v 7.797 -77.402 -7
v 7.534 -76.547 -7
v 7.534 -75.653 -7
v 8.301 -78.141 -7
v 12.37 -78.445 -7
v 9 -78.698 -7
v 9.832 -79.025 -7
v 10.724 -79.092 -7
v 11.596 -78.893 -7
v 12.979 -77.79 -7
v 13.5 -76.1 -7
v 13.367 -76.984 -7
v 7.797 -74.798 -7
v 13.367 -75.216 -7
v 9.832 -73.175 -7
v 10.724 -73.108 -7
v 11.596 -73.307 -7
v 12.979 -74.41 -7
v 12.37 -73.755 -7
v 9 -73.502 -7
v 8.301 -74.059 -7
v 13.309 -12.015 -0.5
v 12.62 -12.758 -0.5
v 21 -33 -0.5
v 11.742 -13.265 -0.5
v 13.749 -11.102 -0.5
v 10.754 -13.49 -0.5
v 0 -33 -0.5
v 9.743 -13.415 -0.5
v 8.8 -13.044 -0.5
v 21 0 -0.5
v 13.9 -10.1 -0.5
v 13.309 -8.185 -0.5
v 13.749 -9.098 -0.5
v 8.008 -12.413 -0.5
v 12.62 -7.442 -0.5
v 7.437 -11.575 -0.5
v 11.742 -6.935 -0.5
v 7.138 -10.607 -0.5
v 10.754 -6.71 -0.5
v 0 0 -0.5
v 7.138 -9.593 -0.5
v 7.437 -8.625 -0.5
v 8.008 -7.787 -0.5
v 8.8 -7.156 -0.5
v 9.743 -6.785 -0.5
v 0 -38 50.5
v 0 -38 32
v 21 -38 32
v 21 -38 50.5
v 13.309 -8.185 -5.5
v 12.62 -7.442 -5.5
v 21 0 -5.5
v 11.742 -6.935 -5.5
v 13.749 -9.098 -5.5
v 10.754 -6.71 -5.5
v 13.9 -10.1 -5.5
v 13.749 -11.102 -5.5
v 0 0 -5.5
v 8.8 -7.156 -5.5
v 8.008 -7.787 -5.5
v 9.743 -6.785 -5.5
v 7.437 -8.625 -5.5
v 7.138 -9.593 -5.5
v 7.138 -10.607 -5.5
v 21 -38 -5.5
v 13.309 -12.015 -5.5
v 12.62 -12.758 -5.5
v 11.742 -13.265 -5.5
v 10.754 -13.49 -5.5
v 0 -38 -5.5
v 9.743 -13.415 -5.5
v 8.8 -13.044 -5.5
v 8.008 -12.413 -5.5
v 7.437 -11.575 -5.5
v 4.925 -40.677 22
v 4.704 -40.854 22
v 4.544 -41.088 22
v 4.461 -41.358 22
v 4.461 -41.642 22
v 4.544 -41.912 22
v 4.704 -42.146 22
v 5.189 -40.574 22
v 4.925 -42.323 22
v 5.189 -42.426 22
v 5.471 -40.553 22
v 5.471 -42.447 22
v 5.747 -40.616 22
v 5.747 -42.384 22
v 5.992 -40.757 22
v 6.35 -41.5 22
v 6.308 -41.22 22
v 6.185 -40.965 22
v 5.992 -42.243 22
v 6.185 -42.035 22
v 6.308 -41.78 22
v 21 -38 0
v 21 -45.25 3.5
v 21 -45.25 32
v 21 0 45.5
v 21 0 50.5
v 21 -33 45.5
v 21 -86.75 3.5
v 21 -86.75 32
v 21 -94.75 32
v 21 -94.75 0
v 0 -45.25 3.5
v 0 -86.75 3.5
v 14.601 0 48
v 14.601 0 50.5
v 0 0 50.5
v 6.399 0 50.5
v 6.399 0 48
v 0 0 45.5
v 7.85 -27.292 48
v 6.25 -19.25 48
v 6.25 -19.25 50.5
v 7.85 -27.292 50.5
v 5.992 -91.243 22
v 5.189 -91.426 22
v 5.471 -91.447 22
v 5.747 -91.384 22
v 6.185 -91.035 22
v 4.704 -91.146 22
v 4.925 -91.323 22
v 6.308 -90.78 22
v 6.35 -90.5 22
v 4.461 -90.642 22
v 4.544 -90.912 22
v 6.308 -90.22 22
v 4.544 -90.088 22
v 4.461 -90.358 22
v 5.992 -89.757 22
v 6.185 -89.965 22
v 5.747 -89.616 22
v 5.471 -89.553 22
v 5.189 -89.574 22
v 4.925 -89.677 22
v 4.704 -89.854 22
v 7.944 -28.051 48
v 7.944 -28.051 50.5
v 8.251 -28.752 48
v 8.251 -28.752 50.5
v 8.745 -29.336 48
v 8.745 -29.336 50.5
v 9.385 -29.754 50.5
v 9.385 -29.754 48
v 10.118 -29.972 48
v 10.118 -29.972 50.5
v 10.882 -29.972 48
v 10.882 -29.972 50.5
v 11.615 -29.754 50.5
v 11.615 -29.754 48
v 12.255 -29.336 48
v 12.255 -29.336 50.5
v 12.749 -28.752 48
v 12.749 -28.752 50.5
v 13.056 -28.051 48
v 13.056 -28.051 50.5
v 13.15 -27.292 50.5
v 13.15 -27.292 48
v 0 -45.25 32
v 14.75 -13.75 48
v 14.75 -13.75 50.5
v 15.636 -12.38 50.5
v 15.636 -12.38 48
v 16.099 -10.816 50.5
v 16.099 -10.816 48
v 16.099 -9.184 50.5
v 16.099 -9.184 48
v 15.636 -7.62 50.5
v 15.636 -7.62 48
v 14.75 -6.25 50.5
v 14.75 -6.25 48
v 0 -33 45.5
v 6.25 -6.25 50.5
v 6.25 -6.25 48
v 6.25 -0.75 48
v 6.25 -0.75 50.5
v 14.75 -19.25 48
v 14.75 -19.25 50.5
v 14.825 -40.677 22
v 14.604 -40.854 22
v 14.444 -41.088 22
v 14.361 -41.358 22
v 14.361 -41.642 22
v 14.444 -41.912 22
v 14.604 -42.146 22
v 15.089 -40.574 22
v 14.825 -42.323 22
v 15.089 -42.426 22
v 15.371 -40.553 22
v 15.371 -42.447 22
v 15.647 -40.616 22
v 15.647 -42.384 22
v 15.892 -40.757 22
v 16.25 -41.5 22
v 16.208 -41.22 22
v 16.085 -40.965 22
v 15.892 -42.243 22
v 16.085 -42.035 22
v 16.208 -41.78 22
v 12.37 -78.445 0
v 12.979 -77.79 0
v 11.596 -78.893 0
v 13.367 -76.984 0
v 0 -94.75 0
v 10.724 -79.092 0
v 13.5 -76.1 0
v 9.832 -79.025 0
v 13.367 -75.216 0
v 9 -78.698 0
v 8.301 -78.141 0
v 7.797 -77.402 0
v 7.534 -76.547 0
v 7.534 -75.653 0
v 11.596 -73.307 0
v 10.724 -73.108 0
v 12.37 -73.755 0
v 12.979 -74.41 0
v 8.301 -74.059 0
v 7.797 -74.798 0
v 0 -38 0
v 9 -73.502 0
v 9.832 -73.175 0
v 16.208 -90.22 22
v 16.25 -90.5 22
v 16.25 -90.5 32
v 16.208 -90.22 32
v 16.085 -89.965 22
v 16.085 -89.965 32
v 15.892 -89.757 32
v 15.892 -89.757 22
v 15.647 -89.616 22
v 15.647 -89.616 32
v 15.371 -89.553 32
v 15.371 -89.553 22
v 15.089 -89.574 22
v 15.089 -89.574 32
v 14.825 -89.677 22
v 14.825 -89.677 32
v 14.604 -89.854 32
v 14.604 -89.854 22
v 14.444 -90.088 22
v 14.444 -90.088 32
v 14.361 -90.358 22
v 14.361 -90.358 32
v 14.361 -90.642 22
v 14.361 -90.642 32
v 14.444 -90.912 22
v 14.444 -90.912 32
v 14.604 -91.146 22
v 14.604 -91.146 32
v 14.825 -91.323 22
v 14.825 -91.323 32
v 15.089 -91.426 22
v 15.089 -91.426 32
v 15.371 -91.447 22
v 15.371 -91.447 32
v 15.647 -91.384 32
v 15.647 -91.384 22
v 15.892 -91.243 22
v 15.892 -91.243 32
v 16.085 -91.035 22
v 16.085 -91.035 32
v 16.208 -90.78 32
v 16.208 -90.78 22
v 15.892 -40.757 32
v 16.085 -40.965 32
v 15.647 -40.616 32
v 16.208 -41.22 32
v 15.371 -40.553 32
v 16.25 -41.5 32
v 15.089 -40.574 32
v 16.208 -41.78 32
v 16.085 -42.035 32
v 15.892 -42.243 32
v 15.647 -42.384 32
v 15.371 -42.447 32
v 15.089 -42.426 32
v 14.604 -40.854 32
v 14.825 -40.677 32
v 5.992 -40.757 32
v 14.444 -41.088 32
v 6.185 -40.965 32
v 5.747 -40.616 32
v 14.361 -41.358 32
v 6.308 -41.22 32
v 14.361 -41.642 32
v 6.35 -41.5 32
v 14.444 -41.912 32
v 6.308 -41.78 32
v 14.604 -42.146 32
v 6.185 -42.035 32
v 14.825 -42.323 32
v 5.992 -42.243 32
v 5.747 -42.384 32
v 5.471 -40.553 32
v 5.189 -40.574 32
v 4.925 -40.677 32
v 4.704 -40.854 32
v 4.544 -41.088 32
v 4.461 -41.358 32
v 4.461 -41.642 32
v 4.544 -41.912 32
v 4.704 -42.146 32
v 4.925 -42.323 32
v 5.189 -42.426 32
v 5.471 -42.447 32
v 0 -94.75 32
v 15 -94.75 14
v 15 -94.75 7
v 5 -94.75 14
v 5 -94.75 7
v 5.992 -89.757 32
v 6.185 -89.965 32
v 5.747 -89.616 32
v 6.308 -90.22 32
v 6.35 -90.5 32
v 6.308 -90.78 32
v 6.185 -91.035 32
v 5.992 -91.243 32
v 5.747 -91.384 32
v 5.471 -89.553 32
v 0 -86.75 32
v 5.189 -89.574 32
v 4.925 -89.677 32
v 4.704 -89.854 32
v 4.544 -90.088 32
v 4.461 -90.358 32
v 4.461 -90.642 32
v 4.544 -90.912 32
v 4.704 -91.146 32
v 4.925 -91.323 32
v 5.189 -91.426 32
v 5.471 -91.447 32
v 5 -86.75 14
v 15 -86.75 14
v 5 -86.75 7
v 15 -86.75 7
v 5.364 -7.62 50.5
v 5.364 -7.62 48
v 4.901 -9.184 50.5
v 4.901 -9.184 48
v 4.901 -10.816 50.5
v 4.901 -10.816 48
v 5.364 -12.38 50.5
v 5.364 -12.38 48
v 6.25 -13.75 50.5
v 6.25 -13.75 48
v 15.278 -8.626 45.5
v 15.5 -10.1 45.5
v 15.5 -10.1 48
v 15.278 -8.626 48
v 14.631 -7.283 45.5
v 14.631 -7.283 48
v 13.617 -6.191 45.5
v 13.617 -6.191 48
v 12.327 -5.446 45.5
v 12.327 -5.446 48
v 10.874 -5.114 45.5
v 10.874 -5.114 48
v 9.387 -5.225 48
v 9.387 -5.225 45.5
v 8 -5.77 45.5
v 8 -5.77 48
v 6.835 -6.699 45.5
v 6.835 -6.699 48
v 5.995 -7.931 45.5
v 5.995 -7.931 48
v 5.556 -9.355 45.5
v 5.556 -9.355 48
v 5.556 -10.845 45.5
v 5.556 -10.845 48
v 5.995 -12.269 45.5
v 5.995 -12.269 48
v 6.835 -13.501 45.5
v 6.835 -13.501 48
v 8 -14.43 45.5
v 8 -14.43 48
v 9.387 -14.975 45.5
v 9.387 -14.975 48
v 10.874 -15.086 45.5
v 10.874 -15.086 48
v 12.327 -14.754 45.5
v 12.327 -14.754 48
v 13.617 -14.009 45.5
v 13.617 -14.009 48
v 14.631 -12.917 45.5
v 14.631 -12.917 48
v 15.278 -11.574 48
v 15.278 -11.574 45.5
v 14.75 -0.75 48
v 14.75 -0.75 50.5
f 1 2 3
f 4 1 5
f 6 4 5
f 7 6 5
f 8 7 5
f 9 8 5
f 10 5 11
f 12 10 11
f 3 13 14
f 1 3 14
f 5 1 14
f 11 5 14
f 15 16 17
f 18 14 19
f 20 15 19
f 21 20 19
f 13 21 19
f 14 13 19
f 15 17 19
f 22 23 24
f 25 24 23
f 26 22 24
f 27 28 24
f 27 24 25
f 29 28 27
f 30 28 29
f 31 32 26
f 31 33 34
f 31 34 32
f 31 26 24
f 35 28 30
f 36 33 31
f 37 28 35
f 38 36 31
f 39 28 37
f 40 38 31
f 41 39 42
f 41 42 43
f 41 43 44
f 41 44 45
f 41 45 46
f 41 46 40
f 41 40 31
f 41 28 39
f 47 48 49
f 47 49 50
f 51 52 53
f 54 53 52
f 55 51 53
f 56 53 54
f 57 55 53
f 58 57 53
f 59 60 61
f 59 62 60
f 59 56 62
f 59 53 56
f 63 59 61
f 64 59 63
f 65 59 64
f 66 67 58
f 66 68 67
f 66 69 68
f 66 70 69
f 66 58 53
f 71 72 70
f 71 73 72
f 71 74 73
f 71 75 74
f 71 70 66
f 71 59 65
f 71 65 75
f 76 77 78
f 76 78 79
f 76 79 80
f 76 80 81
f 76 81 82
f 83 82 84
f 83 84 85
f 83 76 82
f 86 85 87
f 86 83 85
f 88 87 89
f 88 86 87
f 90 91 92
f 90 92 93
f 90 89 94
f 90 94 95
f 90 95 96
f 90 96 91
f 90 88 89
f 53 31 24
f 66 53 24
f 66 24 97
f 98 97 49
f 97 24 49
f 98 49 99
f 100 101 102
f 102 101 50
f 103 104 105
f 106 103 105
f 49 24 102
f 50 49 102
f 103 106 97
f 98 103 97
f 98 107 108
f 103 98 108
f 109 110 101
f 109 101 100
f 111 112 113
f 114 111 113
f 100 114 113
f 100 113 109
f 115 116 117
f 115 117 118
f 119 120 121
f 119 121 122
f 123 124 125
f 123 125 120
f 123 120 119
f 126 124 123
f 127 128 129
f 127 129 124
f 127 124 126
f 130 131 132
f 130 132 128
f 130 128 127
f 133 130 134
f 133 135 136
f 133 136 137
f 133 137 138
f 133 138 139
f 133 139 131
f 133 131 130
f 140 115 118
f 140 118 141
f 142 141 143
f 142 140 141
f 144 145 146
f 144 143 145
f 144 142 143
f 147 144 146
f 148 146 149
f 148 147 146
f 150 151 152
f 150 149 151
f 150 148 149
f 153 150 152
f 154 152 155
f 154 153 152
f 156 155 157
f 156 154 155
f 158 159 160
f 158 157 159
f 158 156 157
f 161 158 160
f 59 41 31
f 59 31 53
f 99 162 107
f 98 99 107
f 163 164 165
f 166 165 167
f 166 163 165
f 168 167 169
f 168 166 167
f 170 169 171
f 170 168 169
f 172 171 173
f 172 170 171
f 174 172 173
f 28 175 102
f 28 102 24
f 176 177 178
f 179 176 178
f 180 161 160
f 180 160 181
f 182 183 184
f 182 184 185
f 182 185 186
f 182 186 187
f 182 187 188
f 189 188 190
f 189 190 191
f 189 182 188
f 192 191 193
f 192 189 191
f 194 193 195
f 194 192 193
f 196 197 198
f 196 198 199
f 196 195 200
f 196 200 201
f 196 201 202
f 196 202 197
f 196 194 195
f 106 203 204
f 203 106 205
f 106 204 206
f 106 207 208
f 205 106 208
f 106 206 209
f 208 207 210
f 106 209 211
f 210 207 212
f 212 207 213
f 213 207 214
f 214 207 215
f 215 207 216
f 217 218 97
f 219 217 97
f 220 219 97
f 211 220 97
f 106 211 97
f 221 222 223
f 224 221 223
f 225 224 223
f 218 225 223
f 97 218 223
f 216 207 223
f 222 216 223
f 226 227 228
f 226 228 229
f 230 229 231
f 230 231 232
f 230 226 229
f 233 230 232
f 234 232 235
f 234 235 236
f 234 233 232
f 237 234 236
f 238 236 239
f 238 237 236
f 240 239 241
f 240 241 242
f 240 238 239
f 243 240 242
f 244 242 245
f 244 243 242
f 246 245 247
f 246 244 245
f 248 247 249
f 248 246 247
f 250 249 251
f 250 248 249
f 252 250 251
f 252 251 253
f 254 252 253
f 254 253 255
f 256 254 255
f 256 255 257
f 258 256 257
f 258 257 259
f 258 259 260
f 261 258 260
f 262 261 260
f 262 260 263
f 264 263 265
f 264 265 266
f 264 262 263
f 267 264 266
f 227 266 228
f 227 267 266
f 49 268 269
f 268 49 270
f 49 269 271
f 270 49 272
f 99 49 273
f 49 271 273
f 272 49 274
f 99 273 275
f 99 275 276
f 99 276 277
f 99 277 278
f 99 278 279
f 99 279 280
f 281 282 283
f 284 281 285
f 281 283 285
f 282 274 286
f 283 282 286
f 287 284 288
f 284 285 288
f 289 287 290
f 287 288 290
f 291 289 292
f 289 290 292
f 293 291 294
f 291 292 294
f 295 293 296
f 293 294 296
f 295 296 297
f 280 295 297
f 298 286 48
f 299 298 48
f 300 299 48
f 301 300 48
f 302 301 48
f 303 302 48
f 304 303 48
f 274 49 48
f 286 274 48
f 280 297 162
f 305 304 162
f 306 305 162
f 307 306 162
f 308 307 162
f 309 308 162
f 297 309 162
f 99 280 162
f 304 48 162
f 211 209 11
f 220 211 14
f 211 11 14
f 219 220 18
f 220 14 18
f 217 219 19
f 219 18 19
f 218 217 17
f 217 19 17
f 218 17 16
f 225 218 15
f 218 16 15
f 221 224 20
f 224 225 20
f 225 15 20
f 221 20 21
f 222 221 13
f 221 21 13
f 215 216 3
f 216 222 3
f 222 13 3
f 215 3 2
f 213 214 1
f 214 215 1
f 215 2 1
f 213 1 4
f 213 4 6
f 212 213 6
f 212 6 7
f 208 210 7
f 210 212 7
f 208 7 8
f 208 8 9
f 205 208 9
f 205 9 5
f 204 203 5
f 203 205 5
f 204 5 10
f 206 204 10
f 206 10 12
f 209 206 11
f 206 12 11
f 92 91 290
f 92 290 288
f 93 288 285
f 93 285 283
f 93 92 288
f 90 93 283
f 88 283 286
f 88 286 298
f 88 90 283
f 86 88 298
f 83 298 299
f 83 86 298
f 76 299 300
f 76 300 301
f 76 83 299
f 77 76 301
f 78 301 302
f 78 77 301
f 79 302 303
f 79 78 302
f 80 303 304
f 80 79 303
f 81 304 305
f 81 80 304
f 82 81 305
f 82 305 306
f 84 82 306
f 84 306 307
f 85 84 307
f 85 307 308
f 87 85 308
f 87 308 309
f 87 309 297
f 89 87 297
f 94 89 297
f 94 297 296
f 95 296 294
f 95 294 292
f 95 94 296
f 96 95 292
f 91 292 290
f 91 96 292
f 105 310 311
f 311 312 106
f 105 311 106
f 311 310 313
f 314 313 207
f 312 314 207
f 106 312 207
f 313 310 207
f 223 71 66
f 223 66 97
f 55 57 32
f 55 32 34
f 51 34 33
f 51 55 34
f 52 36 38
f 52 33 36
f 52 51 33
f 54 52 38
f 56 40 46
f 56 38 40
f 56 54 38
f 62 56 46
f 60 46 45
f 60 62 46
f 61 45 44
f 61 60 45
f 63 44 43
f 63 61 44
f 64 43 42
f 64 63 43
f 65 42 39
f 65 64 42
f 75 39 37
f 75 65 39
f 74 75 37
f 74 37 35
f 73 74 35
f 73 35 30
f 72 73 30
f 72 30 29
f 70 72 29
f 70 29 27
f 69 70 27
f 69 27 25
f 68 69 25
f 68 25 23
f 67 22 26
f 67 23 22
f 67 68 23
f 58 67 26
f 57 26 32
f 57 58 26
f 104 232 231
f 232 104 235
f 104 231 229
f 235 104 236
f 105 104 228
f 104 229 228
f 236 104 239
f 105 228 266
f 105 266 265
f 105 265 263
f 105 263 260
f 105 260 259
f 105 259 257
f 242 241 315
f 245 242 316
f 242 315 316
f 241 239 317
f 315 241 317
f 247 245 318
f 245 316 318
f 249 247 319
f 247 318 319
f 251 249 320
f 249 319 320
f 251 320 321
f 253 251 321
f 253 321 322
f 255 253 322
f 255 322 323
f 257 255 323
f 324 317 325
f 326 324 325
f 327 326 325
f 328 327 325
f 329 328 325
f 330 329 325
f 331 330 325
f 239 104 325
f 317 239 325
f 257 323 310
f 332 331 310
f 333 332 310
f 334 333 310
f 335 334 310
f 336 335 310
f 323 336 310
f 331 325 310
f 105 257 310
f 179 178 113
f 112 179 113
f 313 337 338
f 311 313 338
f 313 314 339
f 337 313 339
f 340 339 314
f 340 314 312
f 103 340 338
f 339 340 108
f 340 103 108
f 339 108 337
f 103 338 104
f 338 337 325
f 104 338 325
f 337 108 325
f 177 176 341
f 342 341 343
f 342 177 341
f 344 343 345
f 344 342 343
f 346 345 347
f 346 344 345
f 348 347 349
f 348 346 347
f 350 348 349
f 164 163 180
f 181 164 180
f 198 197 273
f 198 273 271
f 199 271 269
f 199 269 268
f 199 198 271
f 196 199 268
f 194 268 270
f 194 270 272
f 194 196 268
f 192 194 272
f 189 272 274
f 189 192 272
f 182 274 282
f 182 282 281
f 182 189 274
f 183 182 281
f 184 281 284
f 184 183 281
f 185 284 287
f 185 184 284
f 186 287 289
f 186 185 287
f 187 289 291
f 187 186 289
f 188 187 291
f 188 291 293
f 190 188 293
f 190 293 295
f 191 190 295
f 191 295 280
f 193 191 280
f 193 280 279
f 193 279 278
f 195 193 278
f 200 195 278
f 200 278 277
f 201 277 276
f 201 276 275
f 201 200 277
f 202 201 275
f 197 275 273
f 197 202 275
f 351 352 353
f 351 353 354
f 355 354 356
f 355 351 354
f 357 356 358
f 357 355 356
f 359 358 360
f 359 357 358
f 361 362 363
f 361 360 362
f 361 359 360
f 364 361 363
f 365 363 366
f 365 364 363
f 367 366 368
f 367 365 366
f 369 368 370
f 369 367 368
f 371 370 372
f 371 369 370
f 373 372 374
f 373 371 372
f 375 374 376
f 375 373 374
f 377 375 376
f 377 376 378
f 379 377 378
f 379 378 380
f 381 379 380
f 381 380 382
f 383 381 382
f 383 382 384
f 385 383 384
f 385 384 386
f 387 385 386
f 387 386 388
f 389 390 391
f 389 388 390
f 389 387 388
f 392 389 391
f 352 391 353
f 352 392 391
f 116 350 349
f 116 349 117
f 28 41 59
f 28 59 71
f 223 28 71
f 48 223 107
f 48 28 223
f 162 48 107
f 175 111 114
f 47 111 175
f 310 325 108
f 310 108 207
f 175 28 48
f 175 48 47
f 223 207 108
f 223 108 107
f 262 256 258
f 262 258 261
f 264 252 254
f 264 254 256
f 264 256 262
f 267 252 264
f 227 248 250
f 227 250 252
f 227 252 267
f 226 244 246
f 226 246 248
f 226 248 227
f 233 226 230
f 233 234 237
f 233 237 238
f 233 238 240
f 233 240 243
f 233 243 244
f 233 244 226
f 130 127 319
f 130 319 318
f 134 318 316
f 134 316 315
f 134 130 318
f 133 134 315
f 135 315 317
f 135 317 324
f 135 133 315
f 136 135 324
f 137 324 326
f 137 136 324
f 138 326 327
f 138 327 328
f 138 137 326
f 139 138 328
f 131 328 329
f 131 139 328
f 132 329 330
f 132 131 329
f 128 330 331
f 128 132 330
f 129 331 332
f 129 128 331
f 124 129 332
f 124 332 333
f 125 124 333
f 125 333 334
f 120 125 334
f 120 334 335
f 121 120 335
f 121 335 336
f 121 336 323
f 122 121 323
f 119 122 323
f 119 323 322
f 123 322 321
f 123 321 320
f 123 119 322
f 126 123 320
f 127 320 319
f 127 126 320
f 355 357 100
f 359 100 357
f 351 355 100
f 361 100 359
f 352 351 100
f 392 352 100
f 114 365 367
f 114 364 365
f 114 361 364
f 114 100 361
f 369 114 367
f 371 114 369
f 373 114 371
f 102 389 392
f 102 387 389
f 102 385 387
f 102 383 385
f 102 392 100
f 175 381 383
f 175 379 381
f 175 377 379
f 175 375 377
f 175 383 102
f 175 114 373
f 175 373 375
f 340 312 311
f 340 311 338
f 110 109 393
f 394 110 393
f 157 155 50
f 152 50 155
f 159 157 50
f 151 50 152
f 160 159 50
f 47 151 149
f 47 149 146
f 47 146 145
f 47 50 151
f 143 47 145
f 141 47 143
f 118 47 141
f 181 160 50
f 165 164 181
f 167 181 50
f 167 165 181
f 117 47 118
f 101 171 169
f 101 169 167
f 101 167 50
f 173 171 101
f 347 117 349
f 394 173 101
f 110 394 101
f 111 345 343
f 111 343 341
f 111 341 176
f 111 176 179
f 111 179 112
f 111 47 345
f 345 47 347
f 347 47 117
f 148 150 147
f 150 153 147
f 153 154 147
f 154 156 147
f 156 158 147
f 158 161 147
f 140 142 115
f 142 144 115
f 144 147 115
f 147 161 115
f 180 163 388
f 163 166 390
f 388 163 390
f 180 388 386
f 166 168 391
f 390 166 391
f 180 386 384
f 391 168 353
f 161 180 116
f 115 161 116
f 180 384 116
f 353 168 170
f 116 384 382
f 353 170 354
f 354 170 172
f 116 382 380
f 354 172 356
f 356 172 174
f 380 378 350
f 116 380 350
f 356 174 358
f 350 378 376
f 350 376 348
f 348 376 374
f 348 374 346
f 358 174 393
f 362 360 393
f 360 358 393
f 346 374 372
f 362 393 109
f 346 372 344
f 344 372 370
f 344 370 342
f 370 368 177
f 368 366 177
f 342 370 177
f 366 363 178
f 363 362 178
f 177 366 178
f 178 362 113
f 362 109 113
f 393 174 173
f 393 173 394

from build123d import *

# Parameters (mm, degrees)
CYLINDER030_R     = 3.4
CYLINDER030_DEPTH = 44
CYLINDER029_R     = 5
CYLINDER029_DEPTH = 9
PAD010_DEPTH      = 5
PAD009_DEPTH      = 21
CYLINDER034_R     = 0.95
CYLINDER034_DEPTH = 10
CYLINDER035_R     = 0.95
CYLINDER035_DEPTH = 10
CYLINDER032_R     = 0.95
CYLINDER032_DEPTH = 10
CYLINDER033_R     = 0.95
CYLINDER033_DEPTH = 10
BOX006_W          = 10
BOX006_H          = 10
BOX006_DEPTH      = 7
PAD011_DEPTH      = 21
CYLINDER031_R     = 3
CYLINDER031_DEPTH = 10


with BuildPart() as cylinder030:
    # Cylinder030 → Cylinder030 (new body)
    with BuildSketch(Plane(origin=(10.5, -10.1, -9), x_dir=(1, 0, 0), z_dir=(0, 0, 1))):
        Circle(CYLINDER030_R)
    extrude(amount=CYLINDER030_DEPTH)


with BuildPart() as cylinder029:
    # Cylinder029 → Cylinder029 (new body)
    with BuildSketch(Plane(origin=(10.5, -10.1, 45), x_dir=(1, 0, 0), z_dir=(0, 0, 1))):
        Circle(CYLINDER029_R)
    extrude(amount=CYLINDER029_DEPTH)


with BuildPart() as fusion024:
    # Sketch010 → Pad010 (new body)
    with BuildSketch(Plane.XY):
        with BuildLine():
            Line((-4.25, 3.75), (-4.25, 9.25))
            Line((-4.25, 9.25), (-2.65, 17.292388))
            ThreePointArc((2.65, 17.292388), (0, 20), (-2.65, 17.292388))
            Line((2.65, 17.292388), (4.25, 9.25))
            Line((4.25, 3.75), (4.25, 9.25))
            ThreePointArc((4.25, -3.75), (5.657274, 0), (4.25, 3.75))
            Line((4.25, -3.75), (4.25, -9.25))
            Line((2.65, -17.292388), (4.25, -9.25))
            ThreePointArc((-2.65, -17.292388), (0, -20), (2.65, -17.292388))
            Line((-4.25, -9.25), (-2.65, -17.292388))
            Line((-4.25, -3.75), (-4.25, -9.25))
            ThreePointArc((-4.25, 3.75), (-5.657274, 0), (-4.25, -3.75))
        make_face()
    extrude(amount=PAD010_DEPTH)


with BuildPart() as fusion024_1:
    # Body010 placement: moved
    add(fusion024.part.moved(Location((10.5, -10, 48))))

    # Fusion024: union Cylinder029
    add(cylinder029.part)


with BuildPart() as agarre001:
    # Sketch009 → Pad009 (new body)
    with BuildSketch(Plane.YZ):
        Polygon((-33, -0.5), (0, -0.5), (0, -5.5), (-38, -5.5), (-38, 50.5), (0, 50.5), (0, 45.5), (-33, 45.5), align=None)
    extrude(amount=PAD009_DEPTH)

    # Cut014: cut Fusion024
    add(fusion024_1.part, mode=Mode.SUBTRACT)

    # Cut015: cut Cylinder030
    add(cylinder030.part, mode=Mode.SUBTRACT)


with BuildPart() as cylinder034:
    # Cylinder034 → Cylinder034 (new body)
    with BuildSketch(Plane(origin=(9.9, 0, 0), x_dir=(1, 0, 0), z_dir=(0, 0, 1))):
        Circle(CYLINDER034_R)
    extrude(amount=CYLINDER034_DEPTH)


with BuildPart() as tornillos013:
    # Cylinder035 → Cylinder035 (new body)
    with BuildSketch(Plane.XY):
        Circle(CYLINDER035_R)
    extrude(amount=CYLINDER035_DEPTH)

    # Fusion026: union Cylinder034
    add(cylinder034.part)


with BuildPart() as tornillos013_1:
    # Fusion026 placement: moved
    add(tornillos013.part.moved(Location((5, -24.5, 22))))


with BuildPart() as cylinder032:
    # Cylinder032 → Cylinder032 (new body)
    with BuildSketch(Plane(origin=(9.9, 0, 0), x_dir=(1, 0, 0), z_dir=(0, 0, 1))):
        Circle(CYLINDER032_R)
    extrude(amount=CYLINDER032_DEPTH)


with BuildPart() as fusion027:
    # Cylinder033 → Cylinder033 (new body)
    with BuildSketch(Plane.XY):
        Circle(CYLINDER033_R)
    extrude(amount=CYLINDER033_DEPTH)

    # Fusion025: union Cylinder032
    add(cylinder032.part)


with BuildPart() as fusion027_1:
    # Fusion025 placement: moved
    add(fusion027.part.moved(Location((5, 24.5, 22))))

    # Fusion027: union Tornillos013
    add(tornillos013_1.part)


with BuildPart() as fusion027_2:
    # Fusion027 placement: moved
    add(fusion027_1.part.moved(Location((0.4, 0, 0))))


with BuildPart() as cube006:
    # Box006 → Box006 (new body)
    with BuildSketch(Plane(origin=(5, -29, 7), x_dir=(1, 0, 0), z_dir=(0, 0, 1))):
        with Locations((5, 5)):
            Rectangle(BOX006_W, BOX006_H)
    extrude(amount=BOX006_DEPTH)


with BuildPart() as holder007:
    # Sketch011 → Pad011 (new body)
    with BuildSketch(Plane.YZ):
        Polygon((-28.75, 32), (-28.75, 0), (28.75, 0), (28.75, 32), (20.75, 32), (20.75, 3.5), (-20.75, 3.5), (-20.75, 32), align=None)
    extrude(amount=PAD011_DEPTH)

    # Cut016: cut Cube006
    add(cube006.part, mode=Mode.SUBTRACT)

    # Cut017: cut Fusion027
    add(fusion027_2.part, mode=Mode.SUBTRACT)


with BuildPart() as fusion029:
    # Cylinder031 → Cylinder031 (new body)
    with BuildSketch(Plane(origin=(10.5, -10.1, -7), x_dir=(1, 0, 0), z_dir=(0, 0, 1))):
        Circle(CYLINDER031_R)
    extrude(amount=CYLINDER031_DEPTH)

    # Fusion028: union Holder007
    add(holder007.part)


with BuildPart() as fusion029_1:
    # Fusion028 placement: moved
    add(fusion029.part.moved(Location((0, -66, 0))))

    # Fusion029: union Agarre001
    add(agarre001.part)


solid = fusion029_1.part
